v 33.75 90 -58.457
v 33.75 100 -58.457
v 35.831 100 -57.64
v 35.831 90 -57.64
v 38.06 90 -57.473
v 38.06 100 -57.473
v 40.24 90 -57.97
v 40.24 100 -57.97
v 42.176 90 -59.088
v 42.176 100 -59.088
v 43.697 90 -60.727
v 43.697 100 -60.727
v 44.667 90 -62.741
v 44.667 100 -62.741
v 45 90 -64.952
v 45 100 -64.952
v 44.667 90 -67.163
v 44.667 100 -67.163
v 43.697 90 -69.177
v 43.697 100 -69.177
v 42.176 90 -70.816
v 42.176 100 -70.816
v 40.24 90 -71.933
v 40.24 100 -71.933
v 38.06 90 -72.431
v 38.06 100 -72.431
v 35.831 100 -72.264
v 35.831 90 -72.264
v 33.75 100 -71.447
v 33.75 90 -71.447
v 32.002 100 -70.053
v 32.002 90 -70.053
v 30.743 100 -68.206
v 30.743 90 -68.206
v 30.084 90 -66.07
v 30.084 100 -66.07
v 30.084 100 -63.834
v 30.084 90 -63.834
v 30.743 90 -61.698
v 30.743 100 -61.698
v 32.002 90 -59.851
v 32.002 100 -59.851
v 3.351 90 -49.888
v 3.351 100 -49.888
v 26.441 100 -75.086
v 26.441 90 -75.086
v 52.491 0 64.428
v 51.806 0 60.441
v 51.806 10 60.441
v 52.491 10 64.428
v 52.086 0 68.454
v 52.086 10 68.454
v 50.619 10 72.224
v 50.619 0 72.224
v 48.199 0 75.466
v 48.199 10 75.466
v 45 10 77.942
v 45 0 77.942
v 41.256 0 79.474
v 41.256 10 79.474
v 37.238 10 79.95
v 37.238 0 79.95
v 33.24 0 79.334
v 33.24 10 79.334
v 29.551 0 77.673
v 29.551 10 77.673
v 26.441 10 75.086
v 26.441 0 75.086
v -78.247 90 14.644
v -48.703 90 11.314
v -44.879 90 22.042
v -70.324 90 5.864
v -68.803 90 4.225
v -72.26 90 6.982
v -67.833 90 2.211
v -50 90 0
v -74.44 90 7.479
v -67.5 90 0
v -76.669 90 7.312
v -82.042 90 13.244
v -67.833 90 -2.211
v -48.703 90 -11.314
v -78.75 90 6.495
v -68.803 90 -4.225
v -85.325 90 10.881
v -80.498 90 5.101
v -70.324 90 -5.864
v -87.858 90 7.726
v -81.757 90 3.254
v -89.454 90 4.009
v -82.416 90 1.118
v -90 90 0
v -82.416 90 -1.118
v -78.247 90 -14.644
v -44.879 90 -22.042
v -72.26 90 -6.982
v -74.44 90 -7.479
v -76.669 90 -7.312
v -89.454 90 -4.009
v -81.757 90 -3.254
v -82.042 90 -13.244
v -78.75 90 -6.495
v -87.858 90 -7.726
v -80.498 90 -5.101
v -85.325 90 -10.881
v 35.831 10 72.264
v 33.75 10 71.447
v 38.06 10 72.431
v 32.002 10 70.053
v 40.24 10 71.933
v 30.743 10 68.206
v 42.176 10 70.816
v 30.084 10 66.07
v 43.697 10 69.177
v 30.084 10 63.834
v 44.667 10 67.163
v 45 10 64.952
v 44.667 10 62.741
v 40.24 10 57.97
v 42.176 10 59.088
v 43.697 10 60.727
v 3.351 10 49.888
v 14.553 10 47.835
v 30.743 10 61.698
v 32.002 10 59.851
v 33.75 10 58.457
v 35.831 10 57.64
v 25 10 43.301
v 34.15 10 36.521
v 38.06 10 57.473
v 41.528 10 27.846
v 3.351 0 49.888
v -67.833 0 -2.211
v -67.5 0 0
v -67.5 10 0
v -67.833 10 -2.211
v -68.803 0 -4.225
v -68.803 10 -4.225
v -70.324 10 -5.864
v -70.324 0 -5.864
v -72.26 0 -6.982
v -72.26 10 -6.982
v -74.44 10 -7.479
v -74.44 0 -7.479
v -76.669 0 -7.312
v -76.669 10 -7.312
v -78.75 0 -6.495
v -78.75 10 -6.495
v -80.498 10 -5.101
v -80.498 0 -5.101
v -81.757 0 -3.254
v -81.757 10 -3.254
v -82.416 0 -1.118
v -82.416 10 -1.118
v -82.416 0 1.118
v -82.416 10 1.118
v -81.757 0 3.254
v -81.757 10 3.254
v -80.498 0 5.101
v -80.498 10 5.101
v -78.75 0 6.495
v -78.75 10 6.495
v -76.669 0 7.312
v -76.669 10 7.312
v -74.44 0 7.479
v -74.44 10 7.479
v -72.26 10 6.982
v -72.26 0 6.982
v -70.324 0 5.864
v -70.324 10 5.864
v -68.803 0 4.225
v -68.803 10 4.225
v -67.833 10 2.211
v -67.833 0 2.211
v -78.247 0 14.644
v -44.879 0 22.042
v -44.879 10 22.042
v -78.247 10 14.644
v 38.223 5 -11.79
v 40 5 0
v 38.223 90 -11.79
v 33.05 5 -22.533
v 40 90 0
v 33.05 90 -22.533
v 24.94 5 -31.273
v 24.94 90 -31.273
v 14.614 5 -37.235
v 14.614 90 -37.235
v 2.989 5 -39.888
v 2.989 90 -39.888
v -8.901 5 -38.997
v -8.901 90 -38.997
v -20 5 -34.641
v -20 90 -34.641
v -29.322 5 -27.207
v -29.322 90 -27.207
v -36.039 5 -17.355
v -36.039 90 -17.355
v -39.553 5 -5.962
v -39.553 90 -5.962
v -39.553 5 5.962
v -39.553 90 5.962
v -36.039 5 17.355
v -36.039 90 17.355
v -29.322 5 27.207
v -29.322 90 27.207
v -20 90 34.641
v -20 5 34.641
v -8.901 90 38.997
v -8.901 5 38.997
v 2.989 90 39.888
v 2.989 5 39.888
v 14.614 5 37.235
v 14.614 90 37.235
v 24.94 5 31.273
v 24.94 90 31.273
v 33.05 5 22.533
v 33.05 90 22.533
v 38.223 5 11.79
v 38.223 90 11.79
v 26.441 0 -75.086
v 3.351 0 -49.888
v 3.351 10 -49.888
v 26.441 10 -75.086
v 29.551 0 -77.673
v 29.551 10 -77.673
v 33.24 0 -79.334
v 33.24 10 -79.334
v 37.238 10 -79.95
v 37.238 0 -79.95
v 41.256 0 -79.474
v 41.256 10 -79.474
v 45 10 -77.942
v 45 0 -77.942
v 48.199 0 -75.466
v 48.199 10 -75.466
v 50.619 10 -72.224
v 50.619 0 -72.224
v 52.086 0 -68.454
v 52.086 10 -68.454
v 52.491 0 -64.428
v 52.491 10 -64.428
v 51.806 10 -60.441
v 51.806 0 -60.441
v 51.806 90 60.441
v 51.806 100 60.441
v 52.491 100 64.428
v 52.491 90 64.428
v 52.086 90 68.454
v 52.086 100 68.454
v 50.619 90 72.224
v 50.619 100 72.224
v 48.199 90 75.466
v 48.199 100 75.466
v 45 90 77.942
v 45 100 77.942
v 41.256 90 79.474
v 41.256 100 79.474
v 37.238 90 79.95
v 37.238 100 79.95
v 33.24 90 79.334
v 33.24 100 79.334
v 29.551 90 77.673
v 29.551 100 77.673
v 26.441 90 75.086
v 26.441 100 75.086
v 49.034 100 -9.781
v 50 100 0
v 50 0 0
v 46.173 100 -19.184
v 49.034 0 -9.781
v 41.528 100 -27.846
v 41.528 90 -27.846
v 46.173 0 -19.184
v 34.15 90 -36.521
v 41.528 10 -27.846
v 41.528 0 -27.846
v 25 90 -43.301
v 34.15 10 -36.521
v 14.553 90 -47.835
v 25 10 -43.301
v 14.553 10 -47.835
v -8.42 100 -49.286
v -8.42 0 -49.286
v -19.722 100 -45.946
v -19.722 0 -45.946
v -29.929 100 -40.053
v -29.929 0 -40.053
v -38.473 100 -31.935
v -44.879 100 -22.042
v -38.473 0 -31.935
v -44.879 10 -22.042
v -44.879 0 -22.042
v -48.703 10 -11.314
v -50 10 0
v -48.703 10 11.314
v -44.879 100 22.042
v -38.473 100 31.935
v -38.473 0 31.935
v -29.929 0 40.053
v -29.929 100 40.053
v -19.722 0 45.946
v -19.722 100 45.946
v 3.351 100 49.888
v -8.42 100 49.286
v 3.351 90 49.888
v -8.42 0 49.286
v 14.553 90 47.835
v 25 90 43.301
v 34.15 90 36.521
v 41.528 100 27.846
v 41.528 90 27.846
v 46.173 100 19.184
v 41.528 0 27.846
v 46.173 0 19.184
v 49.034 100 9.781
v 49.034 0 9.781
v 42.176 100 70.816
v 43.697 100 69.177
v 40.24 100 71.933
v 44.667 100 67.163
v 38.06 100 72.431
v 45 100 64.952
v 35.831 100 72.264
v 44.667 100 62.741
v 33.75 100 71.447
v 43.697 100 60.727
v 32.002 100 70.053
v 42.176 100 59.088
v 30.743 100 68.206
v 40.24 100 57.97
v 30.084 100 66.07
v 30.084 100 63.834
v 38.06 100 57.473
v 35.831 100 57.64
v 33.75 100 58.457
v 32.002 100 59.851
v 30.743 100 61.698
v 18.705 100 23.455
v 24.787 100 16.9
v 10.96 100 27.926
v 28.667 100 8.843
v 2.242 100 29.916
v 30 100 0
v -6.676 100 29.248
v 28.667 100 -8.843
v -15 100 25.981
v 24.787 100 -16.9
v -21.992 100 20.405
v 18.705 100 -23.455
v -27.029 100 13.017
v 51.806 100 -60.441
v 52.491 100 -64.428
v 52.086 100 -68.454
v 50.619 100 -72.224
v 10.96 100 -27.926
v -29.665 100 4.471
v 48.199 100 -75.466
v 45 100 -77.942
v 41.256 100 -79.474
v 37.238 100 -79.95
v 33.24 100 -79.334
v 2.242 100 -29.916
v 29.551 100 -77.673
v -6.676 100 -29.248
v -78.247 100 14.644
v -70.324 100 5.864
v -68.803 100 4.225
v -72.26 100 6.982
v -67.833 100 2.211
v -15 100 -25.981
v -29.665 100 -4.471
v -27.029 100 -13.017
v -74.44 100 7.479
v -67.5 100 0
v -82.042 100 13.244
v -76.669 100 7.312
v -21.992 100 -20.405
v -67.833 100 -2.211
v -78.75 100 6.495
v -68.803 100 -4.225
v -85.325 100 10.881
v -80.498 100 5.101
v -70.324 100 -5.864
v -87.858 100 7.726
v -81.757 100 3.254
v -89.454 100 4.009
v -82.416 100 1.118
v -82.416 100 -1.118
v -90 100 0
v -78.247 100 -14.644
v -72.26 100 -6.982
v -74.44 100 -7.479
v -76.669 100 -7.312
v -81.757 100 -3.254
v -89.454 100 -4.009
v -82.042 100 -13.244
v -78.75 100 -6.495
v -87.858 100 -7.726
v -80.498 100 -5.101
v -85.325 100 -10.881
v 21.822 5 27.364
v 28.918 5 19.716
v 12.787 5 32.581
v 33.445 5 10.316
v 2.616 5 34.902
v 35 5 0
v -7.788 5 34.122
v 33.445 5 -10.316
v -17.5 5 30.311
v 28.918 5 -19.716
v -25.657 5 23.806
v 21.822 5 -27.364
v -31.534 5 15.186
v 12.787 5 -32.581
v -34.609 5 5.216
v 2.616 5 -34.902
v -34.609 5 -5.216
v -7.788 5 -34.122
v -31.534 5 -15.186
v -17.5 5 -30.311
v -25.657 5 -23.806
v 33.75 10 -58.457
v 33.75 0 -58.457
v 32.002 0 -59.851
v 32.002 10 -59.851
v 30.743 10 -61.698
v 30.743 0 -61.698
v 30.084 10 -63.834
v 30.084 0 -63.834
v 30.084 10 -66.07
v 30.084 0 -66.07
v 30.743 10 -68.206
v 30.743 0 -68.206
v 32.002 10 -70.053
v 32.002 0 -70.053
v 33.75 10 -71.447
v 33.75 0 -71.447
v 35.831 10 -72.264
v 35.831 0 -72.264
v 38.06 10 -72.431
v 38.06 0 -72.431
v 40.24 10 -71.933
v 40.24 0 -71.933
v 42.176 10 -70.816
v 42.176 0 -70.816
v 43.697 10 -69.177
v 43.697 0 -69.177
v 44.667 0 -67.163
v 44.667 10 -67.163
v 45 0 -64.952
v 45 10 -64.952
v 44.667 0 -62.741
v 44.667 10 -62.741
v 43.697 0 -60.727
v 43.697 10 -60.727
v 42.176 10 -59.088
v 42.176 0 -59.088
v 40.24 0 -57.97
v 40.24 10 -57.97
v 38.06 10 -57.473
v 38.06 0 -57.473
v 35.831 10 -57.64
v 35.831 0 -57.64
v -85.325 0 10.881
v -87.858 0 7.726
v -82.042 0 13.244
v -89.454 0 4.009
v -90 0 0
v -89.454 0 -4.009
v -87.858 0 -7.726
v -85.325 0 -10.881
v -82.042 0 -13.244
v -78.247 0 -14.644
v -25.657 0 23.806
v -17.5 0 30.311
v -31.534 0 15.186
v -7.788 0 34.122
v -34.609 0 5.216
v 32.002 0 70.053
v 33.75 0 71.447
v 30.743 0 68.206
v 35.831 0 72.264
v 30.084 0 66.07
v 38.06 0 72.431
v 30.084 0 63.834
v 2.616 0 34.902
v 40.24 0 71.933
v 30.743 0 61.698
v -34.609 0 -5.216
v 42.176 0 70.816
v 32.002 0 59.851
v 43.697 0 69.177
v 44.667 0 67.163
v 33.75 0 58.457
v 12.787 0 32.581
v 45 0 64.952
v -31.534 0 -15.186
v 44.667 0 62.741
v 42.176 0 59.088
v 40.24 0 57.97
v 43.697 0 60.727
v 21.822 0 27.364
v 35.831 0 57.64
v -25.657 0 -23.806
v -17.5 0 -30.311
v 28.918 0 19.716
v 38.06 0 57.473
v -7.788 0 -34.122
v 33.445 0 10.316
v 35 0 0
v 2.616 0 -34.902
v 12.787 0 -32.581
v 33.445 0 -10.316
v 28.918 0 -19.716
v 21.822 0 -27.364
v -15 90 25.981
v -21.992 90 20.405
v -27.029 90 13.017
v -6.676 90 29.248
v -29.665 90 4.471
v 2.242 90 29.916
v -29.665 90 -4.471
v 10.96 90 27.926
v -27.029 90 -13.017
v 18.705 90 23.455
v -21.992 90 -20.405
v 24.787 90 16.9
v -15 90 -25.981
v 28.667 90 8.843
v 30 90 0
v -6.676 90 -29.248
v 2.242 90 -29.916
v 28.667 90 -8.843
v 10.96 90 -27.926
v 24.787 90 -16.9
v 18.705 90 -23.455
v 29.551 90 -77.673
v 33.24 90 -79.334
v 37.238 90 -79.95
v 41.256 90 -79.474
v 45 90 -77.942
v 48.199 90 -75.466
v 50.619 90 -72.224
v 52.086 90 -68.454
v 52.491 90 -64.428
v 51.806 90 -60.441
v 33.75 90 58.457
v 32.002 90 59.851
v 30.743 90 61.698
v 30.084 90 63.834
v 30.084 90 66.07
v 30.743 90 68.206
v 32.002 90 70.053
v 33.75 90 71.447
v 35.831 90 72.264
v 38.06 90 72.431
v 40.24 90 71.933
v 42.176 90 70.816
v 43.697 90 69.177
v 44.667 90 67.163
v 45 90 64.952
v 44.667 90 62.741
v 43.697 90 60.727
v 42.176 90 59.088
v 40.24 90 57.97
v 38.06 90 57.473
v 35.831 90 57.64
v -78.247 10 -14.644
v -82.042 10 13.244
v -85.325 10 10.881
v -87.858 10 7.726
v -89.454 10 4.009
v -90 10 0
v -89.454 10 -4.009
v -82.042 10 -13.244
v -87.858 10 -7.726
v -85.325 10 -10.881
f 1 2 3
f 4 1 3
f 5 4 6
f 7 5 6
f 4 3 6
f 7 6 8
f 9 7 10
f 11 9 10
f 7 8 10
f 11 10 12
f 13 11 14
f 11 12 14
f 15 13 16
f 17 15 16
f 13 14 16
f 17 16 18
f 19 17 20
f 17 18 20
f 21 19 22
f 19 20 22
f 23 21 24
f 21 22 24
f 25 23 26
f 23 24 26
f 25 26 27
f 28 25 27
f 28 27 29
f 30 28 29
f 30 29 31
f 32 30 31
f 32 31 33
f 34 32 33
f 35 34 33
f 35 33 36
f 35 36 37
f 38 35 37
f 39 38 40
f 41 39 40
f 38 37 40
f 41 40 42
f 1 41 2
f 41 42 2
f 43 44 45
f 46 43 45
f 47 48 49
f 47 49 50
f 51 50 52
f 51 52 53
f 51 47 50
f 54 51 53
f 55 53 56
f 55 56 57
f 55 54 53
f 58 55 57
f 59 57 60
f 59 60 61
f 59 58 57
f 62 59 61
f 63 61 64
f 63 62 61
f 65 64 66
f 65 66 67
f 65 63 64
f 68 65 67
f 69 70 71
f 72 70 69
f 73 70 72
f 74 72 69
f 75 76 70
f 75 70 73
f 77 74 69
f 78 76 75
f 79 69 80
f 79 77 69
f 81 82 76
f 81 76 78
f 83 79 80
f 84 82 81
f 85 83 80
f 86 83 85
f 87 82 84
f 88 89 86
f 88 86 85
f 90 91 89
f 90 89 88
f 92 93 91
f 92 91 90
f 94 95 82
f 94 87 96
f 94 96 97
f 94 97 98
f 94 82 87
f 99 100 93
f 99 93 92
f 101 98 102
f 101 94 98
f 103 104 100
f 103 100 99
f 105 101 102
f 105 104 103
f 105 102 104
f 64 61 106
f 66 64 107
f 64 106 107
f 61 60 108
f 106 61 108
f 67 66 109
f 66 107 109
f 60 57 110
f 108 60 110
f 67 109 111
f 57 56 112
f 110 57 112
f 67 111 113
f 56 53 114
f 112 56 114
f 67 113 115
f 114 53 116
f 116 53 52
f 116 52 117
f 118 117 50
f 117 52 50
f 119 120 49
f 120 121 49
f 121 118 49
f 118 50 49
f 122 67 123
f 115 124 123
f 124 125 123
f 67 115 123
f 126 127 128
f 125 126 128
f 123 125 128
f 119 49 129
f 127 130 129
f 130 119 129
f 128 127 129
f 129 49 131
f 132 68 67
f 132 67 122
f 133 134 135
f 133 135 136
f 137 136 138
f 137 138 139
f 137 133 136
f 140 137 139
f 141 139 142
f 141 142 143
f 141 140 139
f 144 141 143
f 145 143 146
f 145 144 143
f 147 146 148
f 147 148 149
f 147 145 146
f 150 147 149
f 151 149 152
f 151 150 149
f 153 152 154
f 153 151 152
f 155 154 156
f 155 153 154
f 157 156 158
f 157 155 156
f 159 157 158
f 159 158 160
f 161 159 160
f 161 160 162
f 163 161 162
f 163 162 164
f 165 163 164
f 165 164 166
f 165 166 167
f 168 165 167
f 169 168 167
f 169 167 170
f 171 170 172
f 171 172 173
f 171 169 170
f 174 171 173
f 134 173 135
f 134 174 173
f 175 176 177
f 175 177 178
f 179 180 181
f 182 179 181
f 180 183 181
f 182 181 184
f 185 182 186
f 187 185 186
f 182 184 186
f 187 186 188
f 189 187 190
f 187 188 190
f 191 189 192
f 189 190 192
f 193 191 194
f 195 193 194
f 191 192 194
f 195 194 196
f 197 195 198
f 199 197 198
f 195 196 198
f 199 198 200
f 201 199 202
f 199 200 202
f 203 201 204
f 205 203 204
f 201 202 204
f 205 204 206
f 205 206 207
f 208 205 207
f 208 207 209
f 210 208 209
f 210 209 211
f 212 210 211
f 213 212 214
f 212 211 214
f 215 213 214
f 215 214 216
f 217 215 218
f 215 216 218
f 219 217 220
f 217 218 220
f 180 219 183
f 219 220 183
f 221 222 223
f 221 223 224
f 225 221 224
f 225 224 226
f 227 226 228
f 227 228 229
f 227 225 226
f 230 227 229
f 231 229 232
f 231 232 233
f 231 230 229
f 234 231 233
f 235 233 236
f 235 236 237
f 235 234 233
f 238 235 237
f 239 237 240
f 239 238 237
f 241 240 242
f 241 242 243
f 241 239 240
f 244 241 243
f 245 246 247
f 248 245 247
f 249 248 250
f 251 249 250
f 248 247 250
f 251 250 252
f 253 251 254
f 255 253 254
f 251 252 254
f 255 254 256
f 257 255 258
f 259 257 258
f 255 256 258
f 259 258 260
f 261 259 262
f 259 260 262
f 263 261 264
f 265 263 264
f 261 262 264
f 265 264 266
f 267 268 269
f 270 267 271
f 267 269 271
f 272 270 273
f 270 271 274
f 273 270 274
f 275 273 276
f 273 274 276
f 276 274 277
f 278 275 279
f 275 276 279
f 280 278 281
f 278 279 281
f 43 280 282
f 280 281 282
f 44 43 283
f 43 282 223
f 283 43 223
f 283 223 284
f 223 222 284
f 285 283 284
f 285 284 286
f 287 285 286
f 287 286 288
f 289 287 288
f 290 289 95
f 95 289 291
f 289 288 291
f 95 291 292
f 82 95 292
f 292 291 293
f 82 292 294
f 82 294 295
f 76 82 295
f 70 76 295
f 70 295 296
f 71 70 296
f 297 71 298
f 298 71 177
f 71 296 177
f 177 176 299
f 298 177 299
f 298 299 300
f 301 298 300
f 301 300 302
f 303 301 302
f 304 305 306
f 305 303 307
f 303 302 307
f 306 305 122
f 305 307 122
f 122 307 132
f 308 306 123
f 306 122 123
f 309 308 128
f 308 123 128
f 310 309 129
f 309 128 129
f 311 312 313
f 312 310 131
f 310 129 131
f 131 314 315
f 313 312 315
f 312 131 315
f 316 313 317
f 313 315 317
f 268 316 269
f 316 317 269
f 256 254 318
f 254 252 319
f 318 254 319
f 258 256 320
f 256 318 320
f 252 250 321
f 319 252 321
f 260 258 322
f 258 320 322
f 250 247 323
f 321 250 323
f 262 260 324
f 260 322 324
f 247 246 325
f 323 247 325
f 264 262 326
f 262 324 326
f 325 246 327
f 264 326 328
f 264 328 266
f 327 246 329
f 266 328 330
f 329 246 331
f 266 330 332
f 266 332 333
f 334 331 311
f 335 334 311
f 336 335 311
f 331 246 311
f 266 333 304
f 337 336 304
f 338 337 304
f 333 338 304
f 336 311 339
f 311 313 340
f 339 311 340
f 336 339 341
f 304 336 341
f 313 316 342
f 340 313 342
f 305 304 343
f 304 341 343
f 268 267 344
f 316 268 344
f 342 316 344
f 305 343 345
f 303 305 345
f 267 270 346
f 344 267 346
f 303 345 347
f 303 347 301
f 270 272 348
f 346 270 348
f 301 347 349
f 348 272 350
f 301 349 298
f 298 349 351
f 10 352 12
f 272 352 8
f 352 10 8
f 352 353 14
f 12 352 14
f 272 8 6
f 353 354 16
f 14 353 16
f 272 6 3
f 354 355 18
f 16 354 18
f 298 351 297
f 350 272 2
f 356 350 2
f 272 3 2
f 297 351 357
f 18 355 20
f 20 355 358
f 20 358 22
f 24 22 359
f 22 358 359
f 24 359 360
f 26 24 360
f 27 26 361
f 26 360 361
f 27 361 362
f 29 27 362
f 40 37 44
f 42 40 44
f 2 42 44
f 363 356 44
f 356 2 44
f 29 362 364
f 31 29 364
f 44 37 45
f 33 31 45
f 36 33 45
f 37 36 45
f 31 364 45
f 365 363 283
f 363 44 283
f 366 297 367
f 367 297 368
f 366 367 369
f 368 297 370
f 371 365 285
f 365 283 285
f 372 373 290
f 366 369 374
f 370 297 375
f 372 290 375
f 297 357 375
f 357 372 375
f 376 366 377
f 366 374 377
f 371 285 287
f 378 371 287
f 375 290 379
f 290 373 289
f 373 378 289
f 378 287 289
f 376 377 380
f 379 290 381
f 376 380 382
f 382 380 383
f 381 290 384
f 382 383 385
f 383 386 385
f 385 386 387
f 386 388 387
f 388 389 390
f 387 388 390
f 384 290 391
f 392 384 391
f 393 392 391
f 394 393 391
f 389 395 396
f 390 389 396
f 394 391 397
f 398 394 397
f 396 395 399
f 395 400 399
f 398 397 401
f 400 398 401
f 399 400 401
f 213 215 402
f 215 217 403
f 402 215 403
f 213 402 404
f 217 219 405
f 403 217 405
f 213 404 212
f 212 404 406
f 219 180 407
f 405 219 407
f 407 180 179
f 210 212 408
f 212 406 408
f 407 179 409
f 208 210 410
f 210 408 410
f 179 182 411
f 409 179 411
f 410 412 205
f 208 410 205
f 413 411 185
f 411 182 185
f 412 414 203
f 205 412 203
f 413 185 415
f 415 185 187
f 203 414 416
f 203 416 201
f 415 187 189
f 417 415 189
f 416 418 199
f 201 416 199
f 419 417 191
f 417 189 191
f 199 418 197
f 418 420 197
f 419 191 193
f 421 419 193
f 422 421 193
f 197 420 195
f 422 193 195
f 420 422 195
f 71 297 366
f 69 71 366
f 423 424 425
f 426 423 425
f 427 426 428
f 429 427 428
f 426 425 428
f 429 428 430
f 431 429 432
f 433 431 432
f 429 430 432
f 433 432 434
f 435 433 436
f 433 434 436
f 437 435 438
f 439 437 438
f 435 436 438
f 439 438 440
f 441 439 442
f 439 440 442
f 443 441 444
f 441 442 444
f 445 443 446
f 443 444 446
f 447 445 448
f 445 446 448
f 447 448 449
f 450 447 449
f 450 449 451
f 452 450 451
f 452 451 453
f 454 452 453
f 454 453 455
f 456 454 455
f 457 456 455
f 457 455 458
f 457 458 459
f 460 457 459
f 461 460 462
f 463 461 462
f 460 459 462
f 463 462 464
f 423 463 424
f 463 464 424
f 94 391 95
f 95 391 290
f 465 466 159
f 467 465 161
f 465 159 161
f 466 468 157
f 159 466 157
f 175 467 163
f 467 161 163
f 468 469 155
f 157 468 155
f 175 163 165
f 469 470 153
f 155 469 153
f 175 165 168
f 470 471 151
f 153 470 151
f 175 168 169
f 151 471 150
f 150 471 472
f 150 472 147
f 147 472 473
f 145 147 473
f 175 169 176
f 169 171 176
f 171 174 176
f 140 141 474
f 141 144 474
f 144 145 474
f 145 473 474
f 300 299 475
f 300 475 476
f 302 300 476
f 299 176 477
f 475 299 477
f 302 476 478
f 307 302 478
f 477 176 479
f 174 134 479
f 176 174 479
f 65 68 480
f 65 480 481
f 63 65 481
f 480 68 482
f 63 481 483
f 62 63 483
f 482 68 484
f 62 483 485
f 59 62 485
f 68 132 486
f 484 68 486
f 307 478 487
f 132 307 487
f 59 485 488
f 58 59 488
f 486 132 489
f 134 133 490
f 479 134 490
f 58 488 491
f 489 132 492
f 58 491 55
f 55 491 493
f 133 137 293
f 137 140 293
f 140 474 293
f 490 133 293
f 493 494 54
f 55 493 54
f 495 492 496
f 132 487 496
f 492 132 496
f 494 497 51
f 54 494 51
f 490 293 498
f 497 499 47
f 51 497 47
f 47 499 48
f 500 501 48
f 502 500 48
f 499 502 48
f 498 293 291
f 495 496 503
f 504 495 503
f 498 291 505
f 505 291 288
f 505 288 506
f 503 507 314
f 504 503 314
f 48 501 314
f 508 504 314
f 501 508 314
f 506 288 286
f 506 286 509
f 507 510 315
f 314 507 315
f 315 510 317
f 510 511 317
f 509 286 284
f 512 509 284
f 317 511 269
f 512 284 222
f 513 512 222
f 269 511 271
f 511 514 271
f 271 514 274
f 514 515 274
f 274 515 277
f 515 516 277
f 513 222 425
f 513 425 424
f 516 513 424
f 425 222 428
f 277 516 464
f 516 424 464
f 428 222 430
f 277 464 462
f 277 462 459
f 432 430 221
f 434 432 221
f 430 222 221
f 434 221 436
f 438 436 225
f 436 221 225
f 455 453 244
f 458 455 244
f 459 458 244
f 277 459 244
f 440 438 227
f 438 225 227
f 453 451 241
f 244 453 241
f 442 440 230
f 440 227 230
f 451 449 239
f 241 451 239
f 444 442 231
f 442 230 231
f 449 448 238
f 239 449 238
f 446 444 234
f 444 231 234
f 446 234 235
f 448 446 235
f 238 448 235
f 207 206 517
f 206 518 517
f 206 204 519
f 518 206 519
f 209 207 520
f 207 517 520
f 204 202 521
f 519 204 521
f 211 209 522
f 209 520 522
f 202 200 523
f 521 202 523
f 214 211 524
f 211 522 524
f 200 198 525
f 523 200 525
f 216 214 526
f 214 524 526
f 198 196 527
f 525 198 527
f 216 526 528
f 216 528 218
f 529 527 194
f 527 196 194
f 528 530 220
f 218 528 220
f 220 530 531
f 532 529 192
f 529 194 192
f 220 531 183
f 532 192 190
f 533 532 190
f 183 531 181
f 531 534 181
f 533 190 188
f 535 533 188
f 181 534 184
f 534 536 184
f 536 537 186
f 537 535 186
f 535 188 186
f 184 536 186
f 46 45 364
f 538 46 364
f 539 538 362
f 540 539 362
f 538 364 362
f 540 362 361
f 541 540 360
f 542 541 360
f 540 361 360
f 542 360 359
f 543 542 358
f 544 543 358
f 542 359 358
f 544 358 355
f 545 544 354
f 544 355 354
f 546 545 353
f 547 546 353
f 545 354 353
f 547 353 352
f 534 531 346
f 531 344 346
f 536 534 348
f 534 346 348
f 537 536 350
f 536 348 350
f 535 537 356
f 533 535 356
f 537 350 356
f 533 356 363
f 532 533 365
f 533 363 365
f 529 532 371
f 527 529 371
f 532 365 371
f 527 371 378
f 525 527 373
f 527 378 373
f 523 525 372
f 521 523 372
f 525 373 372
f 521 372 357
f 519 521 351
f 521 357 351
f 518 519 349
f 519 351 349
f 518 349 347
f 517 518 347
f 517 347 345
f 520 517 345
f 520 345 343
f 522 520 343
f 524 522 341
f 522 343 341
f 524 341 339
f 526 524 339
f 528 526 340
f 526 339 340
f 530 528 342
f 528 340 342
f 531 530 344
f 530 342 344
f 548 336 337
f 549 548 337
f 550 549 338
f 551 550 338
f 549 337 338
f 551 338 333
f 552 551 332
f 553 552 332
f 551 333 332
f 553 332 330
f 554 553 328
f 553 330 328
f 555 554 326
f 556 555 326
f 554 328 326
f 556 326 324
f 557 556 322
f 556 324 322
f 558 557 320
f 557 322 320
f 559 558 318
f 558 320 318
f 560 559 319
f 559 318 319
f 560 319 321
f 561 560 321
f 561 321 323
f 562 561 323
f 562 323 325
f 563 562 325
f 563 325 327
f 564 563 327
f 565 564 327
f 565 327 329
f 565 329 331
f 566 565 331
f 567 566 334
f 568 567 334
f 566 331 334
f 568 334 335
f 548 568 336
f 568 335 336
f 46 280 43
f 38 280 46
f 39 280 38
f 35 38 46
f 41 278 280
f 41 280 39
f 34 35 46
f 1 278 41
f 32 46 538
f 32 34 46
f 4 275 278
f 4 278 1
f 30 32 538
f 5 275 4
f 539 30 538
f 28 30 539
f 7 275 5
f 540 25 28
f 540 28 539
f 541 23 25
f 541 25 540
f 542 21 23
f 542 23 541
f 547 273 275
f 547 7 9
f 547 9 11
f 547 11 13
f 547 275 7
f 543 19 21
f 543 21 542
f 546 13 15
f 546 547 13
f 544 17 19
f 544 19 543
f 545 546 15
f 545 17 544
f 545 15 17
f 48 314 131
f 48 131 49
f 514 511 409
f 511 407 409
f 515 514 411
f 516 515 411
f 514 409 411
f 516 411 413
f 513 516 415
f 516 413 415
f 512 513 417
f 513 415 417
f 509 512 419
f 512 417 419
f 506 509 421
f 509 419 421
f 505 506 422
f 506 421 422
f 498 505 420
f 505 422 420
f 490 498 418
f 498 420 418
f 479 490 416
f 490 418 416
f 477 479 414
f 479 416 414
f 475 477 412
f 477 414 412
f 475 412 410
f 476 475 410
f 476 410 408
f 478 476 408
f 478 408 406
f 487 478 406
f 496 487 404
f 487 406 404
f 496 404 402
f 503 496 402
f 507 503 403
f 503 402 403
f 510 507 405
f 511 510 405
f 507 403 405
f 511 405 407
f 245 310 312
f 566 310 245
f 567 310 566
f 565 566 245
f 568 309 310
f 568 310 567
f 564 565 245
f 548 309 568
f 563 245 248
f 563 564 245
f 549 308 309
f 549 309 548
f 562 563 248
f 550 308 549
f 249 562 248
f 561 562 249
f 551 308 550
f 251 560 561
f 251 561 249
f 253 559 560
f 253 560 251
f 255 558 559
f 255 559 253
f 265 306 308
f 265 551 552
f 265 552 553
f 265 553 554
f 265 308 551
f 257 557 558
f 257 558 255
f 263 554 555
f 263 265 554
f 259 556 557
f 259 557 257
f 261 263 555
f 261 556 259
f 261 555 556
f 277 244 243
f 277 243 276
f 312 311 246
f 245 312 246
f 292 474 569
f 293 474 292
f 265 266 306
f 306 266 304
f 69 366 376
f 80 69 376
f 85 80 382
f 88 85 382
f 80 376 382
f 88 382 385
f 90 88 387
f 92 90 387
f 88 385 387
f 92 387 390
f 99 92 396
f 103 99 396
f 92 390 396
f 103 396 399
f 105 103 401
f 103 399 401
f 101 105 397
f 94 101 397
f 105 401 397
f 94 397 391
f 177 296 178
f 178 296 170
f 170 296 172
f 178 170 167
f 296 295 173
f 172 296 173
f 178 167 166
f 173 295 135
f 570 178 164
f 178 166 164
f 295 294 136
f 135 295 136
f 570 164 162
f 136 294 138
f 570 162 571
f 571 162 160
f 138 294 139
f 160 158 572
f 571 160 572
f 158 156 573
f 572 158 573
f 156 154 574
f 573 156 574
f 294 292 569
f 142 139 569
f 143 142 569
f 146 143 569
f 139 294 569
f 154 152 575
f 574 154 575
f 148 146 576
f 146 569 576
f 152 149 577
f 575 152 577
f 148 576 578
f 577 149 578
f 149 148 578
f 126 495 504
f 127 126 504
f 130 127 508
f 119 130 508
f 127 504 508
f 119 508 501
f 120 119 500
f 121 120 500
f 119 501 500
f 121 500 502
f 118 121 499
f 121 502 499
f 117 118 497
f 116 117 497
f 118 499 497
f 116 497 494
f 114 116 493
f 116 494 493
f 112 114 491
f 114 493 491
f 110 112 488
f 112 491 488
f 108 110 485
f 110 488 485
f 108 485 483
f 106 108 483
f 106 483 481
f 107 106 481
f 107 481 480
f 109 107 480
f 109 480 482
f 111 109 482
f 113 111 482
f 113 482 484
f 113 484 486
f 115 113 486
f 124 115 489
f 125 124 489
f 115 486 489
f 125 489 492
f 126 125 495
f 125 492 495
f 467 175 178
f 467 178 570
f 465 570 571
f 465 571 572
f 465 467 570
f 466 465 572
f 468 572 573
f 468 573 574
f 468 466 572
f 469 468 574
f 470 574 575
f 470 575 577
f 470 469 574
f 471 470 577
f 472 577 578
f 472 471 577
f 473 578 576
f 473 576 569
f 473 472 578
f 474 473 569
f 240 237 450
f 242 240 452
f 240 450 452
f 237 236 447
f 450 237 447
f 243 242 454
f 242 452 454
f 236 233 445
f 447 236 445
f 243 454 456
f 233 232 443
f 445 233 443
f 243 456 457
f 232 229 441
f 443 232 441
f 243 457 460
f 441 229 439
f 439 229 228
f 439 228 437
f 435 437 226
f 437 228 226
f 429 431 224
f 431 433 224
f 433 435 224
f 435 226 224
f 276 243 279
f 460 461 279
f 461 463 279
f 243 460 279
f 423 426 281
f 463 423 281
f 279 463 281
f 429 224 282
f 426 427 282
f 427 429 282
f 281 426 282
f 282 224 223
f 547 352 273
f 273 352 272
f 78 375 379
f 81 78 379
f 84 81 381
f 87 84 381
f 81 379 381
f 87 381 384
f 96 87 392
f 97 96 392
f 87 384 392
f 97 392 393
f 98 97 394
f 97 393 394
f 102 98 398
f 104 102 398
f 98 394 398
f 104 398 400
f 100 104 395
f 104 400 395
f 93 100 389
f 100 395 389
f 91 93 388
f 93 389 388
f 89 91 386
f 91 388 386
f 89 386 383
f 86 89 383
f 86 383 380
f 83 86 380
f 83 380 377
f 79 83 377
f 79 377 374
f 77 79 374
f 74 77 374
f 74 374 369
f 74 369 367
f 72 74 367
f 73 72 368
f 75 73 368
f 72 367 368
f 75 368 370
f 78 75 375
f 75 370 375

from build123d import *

# Parameters (mm, degrees)
SKETCH2_R               = 7.5
BOSS_EXTRUDE1_DEPTH     = 10
CIRPATTERN1_COUNT       = 3
MIRROR1_COPY_1_SKETCH_R = 7.5
MIRROR1_COPY_1_DEPTH    = 10
MIRROR1_COPY_2_SKETCH_R = 7.5
MIRROR1_COPY_2_DEPTH    = 10


with BuildPart() as part:
    # Sketch1 → Revolve1 (revolve)
    with BuildSketch(Plane.XY):
        Polygon((35, 0), (35, 5), (40, 5), (40, 90), (30, 90), (30, 100), (50, 100), (50, 0), align=None)
    revolve(axis=Axis((0, 0, 0), (0, 1, 0)))

    # Sketch2 → Boss-Extrude1 (add)
    with BuildSketch(Plane(origin=(0, 100, 0), x_dir=(1, 0, 0), z_dir=(0, 1, 0))):
        with BuildLine():
            Line((-78.246594209, 14.644440107), (-44.879398453, 22.041769313))
            ThreePointArc((-44.879398453, 22.041769313), (-50, 0), (-44.879398453, -22.041769313))
            Line((-44.879398453, -22.041769313), (-78.246594209, -14.644440107))
            ThreePointArc((-78.246594209, -14.644440107), (-90, 0), (-78.246594209, 14.644440107))
        make_face()
        with Locations((-75, 0)):
            Circle(SKETCH2_R, mode=Mode.SUBTRACT)
    boss_extrude1 = extrude(amount=-BOSS_EXTRUDE1_DEPTH)

    # CirPattern1: Boss-Extrude1 ×3 about axis
    cirpattern1_axis = Axis((0, 0, 0), (0, 1, 0))
    for i in range(1, CIRPATTERN1_COUNT):
        add(boss_extrude1.rotate(cirpattern1_axis, i * 360 / CIRPATTERN1_COUNT))

    # Mirror1: Boss-Extrude1 across plane
    add(boss_extrude1.mirror(Plane.ZX.offset(50)))

    # Mirror1 copy 1 sketch → Mirror1 copy 1 (add)
    with BuildSketch(Plane(origin=(0, 0, 0), x_dir=(-0.5, 0, -0.866025404), z_dir=(0, -1, 0))):
        with BuildLine():
            Line((-78.246594209, -14.644440107), (-44.879398453, -22.041769313))
            ThreePointArc((-44.879398453, -22.041769313), (-50, 0), (-44.879398453, 22.041769313))
            Line((-44.879398453, 22.041769313), (-78.246594209, 14.644440107))
            ThreePointArc((-78.246594209, 14.644440107), (-90, 0), (-78.246594209, -14.644440107))
        make_face()
        with Locations((-75, 0)):
            Circle(MIRROR1_COPY_1_SKETCH_R, mode=Mode.SUBTRACT)
    extrude(amount=-MIRROR1_COPY_1_DEPTH)

    # Mirror1 copy 2 sketch → Mirror1 copy 2 (add)
    with BuildSketch(Plane(origin=(0, 0, 0), x_dir=(-0.5, 0, 0.866025404), z_dir=(0, -1, 0))):
        with BuildLine():
            Line((-78.246594209, -14.644440107), (-44.879398453, -22.041769313))
            ThreePointArc((-44.879398453, -22.041769313), (-50, 0), (-44.879398453, 22.041769313))
            Line((-44.879398453, 22.041769313), (-78.246594209, 14.644440107))
            ThreePointArc((-78.246594209, 14.644440107), (-90, 0), (-78.246594209, -14.644440107))
        make_face()
        with Locations((-75, 0)):
            Circle(MIRROR1_COPY_2_SKETCH_R, mode=Mode.SUBTRACT)
    extrude(amount=-MIRROR1_COPY_2_DEPTH)


solid = part.part
